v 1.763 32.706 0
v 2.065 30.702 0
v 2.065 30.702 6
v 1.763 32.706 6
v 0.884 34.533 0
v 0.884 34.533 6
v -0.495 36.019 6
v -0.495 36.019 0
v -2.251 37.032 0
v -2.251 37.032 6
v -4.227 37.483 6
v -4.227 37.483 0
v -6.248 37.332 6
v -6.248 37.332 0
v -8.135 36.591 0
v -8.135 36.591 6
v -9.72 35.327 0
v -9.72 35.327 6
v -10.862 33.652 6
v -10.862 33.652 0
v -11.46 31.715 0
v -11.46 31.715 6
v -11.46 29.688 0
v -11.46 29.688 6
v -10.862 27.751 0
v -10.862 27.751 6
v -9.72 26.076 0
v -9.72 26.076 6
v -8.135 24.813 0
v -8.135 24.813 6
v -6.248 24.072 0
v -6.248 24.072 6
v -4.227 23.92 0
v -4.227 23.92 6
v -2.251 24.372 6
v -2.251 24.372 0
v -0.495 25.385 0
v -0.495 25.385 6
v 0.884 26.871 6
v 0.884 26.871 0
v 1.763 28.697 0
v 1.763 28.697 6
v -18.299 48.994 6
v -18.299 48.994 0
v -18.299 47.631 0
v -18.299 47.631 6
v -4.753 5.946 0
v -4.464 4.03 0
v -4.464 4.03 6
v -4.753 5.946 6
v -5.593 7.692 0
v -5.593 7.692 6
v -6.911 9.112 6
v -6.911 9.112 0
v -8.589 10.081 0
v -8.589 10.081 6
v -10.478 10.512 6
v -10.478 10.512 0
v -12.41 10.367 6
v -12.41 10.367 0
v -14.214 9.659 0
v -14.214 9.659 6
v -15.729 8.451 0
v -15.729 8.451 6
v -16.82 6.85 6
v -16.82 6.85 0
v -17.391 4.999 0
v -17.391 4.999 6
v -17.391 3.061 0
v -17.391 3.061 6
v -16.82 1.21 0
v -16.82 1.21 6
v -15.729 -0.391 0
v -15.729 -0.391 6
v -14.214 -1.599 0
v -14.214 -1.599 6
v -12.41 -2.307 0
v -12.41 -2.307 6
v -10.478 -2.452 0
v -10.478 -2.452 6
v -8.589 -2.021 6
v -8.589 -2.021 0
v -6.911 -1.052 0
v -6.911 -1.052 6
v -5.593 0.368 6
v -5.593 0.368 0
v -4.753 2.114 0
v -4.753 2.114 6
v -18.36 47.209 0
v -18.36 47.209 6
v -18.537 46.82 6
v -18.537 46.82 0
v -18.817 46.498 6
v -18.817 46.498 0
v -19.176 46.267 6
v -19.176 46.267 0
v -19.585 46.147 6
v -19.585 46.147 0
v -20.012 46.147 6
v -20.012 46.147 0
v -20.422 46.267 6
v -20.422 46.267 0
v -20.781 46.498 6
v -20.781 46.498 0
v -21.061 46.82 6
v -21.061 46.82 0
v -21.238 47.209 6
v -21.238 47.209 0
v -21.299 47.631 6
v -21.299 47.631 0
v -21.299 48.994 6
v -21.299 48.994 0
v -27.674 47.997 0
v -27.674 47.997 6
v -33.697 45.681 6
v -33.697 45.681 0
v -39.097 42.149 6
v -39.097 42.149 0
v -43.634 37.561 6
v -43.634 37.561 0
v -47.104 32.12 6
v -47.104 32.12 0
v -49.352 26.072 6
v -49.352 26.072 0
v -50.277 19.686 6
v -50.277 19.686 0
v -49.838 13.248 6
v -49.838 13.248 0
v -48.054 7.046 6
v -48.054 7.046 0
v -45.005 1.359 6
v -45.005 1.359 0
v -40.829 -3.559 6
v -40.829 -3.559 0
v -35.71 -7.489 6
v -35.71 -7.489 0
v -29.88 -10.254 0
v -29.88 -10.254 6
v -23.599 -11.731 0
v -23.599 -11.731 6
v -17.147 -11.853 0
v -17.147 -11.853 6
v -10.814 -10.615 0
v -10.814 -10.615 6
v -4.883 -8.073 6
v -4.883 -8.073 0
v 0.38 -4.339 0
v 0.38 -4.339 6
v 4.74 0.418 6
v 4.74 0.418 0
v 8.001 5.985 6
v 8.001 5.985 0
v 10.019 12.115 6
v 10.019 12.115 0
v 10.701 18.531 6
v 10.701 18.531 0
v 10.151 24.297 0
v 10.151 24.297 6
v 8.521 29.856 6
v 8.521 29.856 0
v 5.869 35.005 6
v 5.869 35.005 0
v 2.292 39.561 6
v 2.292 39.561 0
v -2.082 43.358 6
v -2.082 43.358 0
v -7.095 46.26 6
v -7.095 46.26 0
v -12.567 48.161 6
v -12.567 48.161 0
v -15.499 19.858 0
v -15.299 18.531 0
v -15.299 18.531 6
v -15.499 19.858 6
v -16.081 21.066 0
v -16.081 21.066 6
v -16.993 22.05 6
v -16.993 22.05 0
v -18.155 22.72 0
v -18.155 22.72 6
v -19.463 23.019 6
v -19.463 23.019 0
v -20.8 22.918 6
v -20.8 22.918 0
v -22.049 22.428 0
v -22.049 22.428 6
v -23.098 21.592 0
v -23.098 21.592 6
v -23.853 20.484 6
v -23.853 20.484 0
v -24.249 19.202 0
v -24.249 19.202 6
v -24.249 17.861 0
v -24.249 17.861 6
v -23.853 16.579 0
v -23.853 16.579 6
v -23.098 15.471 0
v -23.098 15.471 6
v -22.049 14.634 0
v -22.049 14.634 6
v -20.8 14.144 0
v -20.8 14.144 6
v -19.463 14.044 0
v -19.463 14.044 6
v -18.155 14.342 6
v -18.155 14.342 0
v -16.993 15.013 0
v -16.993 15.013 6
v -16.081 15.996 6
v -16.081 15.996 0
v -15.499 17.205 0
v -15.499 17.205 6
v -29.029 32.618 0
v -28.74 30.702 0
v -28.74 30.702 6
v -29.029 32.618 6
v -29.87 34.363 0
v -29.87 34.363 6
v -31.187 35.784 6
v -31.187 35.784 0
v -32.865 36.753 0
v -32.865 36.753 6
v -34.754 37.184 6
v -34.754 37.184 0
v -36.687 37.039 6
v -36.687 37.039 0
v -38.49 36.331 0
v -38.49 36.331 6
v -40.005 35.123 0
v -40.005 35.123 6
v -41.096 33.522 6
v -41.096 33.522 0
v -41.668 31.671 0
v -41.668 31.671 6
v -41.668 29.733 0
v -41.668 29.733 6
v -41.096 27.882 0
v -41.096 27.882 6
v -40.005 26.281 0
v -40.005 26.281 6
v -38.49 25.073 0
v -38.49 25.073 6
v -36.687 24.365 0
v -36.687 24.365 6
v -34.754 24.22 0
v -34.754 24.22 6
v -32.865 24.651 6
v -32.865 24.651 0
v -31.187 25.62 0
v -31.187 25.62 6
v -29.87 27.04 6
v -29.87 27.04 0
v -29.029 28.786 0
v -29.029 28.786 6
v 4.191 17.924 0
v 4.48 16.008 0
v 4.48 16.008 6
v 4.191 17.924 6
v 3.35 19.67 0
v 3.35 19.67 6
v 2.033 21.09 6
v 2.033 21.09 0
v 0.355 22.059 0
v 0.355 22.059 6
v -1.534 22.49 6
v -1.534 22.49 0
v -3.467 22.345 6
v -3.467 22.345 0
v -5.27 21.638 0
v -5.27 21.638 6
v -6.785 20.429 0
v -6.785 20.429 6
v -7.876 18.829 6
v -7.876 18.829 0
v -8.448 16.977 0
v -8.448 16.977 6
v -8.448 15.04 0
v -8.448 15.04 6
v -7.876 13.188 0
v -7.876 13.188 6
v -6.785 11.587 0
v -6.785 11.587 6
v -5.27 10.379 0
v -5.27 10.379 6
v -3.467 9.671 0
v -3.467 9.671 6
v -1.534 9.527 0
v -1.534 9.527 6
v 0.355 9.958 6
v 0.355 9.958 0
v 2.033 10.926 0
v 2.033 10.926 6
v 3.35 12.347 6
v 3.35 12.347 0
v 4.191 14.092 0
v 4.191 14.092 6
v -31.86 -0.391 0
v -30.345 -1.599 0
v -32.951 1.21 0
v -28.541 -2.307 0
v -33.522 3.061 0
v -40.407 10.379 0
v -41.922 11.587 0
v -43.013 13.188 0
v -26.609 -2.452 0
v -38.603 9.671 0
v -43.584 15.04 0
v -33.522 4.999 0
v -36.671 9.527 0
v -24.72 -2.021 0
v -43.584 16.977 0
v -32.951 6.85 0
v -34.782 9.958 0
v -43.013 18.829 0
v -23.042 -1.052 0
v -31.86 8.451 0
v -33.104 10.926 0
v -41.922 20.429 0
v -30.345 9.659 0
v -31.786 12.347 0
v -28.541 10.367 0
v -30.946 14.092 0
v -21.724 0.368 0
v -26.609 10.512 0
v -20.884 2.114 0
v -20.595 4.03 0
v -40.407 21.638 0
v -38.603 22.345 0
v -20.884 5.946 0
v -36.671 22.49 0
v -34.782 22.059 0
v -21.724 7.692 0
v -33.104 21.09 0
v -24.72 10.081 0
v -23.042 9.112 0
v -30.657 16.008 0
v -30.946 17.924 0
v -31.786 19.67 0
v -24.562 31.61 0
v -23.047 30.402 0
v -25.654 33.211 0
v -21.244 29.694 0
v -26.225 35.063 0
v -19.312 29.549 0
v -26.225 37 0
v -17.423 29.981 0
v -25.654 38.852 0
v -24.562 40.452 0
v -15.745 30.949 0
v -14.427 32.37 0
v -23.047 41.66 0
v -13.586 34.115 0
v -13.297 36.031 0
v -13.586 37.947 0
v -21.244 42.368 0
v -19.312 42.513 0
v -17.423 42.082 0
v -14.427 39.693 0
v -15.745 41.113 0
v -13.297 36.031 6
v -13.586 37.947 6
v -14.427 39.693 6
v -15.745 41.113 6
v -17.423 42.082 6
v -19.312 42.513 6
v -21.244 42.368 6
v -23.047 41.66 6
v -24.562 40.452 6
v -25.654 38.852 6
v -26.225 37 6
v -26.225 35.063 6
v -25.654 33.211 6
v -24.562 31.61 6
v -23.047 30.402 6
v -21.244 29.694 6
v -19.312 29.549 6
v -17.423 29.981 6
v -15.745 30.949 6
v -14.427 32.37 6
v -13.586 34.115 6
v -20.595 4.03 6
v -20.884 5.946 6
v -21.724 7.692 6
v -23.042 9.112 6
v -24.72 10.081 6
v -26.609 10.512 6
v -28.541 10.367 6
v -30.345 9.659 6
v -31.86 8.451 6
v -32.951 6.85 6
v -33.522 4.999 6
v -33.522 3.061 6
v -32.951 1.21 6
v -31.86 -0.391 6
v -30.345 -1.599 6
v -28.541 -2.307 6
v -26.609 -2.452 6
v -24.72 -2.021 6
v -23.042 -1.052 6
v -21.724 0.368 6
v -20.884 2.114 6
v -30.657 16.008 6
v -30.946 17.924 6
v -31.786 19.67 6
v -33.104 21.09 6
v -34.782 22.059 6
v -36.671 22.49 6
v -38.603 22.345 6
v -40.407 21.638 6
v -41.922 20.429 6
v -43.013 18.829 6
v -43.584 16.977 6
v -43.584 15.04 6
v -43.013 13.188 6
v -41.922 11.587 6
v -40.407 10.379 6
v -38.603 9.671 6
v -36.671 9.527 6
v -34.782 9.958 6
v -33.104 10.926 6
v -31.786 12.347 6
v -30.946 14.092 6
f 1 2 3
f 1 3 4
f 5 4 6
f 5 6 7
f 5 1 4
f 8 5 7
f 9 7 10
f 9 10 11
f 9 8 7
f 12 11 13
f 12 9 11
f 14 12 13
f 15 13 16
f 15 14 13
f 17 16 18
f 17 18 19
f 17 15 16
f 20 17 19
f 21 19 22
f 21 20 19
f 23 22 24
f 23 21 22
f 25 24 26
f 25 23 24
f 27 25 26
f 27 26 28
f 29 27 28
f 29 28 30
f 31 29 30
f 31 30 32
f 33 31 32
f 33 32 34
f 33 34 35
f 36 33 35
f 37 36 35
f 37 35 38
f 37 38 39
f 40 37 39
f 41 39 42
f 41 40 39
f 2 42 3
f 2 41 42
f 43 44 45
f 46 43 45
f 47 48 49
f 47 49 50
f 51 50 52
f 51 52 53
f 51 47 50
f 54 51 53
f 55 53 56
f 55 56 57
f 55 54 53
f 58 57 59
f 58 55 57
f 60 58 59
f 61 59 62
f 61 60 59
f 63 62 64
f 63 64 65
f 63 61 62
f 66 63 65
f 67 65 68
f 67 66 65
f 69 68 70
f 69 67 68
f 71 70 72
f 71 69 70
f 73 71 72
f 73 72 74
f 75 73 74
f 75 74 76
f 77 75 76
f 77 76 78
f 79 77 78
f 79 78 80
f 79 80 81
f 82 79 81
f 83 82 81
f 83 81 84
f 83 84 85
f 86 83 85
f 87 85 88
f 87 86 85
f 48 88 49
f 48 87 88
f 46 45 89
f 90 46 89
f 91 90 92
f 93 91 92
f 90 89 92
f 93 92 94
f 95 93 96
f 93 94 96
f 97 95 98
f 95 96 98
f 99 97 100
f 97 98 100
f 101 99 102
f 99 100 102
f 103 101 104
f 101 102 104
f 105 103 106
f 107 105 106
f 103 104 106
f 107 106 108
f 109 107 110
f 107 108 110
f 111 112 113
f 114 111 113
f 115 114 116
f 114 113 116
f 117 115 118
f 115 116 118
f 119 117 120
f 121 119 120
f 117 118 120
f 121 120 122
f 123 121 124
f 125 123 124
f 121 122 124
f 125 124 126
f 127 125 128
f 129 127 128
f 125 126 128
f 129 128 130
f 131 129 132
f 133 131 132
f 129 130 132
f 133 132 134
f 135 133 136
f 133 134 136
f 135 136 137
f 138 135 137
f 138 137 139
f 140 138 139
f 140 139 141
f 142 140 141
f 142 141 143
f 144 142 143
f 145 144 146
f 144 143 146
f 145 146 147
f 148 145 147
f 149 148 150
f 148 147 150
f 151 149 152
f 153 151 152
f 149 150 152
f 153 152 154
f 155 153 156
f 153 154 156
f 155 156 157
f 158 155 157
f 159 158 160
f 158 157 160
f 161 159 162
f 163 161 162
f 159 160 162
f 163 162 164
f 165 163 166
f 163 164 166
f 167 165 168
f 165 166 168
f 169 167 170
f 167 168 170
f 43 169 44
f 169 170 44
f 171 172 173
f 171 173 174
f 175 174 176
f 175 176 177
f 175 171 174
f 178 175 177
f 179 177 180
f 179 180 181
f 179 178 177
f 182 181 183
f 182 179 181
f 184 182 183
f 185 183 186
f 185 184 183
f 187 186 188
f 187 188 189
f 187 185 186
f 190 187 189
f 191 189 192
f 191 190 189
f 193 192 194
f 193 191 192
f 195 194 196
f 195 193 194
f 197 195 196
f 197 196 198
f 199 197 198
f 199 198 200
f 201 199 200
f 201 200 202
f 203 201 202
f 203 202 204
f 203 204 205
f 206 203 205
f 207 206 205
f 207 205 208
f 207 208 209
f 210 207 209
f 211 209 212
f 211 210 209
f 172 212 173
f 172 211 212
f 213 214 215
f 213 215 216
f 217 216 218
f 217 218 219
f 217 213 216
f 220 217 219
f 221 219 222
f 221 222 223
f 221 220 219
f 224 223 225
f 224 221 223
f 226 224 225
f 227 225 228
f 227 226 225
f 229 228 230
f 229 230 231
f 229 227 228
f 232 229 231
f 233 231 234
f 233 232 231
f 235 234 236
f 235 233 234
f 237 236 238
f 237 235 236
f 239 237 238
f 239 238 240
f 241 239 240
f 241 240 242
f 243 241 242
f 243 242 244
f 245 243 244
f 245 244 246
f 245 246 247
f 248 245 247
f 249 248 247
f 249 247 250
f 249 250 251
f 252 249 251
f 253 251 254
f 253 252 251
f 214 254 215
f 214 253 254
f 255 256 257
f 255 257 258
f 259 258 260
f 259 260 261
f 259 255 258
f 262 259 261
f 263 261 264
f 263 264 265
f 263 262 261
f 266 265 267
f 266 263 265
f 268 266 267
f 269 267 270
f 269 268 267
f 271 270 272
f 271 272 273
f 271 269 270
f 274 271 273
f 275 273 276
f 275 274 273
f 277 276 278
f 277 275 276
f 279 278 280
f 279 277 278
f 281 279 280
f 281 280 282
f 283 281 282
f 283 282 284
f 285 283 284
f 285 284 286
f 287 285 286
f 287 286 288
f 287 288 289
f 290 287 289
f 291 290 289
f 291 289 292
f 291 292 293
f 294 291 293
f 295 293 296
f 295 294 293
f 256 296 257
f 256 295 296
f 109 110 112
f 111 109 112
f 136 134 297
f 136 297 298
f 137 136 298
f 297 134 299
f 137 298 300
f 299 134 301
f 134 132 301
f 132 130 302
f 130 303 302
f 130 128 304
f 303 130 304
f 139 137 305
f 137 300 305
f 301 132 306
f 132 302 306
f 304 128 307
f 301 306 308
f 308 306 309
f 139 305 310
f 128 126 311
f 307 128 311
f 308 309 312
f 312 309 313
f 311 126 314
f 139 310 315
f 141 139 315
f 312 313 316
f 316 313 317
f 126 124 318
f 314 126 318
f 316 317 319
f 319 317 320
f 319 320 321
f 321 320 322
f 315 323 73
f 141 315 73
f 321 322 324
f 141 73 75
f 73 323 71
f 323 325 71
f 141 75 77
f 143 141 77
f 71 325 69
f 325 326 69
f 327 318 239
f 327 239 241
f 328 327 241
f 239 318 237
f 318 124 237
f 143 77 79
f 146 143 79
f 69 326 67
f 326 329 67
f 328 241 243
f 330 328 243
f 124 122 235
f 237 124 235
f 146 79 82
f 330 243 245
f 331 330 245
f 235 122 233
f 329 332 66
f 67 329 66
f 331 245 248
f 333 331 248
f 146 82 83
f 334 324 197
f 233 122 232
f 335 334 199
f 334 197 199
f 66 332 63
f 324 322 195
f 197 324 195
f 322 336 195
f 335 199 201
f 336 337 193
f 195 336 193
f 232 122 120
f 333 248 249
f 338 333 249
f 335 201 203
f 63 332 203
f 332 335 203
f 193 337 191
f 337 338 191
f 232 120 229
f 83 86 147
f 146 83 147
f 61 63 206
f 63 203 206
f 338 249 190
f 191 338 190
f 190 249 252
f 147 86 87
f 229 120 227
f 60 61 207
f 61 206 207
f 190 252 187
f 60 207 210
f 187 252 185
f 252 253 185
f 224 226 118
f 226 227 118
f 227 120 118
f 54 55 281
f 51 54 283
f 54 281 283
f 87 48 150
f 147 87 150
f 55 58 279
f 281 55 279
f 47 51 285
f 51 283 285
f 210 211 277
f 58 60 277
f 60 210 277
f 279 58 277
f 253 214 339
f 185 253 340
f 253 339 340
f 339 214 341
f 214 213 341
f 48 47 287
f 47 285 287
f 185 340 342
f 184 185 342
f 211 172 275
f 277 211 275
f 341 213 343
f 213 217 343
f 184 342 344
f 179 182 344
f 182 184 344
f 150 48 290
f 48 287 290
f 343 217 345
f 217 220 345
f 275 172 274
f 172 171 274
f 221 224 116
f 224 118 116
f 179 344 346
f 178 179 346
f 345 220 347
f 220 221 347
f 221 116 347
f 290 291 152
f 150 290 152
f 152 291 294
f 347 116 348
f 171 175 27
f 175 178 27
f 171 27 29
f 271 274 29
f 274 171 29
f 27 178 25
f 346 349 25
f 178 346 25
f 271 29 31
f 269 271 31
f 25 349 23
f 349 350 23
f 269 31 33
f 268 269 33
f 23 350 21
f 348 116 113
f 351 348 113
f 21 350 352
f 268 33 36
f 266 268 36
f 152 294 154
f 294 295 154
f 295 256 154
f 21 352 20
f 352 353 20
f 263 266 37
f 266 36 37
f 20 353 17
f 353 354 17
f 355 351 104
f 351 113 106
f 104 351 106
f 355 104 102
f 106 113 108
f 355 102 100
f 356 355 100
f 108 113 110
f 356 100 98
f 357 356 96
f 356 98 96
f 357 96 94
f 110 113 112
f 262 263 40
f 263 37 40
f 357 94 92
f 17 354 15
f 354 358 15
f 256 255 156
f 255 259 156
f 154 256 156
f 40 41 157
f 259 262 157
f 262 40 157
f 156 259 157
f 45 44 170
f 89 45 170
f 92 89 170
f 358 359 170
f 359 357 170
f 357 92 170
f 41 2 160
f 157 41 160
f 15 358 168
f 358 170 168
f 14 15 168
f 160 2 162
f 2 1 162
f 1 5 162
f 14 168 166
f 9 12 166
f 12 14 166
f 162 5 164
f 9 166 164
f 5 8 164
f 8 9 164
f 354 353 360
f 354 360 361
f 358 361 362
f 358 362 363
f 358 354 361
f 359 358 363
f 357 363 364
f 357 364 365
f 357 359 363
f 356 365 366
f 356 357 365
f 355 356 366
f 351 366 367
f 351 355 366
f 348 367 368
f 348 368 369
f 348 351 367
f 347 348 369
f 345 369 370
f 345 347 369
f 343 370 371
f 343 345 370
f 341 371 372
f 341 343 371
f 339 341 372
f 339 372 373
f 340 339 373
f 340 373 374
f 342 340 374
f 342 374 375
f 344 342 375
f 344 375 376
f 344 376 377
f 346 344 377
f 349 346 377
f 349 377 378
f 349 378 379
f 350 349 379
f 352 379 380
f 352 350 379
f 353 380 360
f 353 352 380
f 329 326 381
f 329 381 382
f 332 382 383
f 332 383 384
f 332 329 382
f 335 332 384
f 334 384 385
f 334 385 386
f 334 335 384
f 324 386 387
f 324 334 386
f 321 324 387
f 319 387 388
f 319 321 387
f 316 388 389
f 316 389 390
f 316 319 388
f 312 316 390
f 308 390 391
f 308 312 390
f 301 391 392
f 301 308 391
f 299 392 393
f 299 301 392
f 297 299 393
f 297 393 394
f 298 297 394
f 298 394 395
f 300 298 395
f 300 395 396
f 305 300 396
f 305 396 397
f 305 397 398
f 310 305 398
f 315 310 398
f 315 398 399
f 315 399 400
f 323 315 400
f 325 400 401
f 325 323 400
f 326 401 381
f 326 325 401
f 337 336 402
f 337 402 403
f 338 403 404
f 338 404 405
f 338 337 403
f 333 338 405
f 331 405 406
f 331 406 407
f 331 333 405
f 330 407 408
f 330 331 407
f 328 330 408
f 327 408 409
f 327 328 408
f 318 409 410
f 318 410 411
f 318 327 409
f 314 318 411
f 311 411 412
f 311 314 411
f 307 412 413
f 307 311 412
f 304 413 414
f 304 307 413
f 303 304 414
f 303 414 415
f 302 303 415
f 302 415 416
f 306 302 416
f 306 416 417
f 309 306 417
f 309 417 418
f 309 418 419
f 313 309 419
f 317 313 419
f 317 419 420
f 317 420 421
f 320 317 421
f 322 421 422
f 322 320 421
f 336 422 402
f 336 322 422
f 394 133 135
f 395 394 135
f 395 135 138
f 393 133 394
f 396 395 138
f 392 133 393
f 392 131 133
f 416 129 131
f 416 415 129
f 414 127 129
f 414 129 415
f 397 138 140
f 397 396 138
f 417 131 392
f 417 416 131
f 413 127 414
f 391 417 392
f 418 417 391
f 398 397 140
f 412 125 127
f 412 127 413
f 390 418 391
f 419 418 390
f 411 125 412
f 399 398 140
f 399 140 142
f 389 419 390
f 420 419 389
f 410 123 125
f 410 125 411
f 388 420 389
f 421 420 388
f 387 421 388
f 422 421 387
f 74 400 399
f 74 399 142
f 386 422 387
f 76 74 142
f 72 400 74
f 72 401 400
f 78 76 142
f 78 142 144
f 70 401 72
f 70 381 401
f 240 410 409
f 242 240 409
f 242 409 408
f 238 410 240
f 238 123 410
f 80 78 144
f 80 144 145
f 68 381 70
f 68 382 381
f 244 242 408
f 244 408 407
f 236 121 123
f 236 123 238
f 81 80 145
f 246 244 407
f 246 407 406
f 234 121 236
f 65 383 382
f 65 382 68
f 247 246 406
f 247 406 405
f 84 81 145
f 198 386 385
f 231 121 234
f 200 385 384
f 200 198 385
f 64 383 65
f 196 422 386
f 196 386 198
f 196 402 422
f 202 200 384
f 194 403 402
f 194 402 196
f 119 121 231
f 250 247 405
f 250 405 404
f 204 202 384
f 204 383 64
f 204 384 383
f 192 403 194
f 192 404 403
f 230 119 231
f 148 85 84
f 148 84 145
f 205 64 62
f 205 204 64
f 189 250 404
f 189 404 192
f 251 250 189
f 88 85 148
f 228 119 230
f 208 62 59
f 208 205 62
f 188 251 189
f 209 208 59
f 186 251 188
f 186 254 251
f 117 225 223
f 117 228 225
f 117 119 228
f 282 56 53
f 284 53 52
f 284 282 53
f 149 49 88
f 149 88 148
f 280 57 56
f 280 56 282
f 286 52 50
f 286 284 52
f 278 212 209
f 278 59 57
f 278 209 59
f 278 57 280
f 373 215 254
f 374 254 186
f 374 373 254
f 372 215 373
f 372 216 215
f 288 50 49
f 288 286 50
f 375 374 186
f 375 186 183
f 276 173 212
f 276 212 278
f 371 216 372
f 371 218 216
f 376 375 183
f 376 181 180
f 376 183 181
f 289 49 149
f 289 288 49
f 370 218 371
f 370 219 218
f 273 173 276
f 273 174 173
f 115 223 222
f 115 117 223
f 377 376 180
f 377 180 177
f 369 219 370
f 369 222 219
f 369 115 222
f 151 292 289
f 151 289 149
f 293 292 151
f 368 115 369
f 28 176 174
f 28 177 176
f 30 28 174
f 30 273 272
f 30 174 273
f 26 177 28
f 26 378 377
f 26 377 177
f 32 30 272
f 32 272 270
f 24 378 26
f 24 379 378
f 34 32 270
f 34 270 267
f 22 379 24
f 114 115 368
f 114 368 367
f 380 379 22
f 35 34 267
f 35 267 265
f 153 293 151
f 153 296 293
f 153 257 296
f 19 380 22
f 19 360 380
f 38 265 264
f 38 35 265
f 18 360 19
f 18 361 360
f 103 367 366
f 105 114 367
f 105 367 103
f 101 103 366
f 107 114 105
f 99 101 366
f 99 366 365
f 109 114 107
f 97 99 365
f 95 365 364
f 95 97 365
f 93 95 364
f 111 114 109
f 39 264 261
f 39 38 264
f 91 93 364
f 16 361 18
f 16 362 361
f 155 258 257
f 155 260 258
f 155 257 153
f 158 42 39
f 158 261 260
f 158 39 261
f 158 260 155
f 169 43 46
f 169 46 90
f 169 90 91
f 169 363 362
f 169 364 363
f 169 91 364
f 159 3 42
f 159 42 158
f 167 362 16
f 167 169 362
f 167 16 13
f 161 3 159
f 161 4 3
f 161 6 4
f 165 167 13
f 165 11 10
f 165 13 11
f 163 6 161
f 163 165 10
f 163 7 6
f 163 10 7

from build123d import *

# Parameters (mm, degrees)
SZKIC1_R                    = 6.5
SZKIC1_R_2                  = 4.5
SZKIC1_R_3                  = 6.800419073
DODANIE_WYCI_GNI_CIE1_DEPTH = 6


with BuildPart() as part:
    # Szkic1 → Dodanie-wyciągnięcie1 (new body)
    with BuildSketch(Plane.XY):
        with BuildLine():
            ThreePointArc((10.70117022, 18.531289035), (2.291892255, 39.56102988), (-18.29882978, 48.994381459))
            Line((-18.29882978, 48.994381459), (-18.29882978, 47.631289035))
            ThreePointArc((-18.29882978, 47.631289035), (-19.79882978, 46.131289035), (-21.29882978, 47.631289035))
            Line((-21.29882978, 47.631289035), (-21.29882978, 48.994381459))
            ThreePointArc((-21.29882978, 48.994381459), (-40.828570624, -3.559432999), (10.70117022, 18.531289035))
        make_face()
        with Locations((-37.156723858, 16.008369355)):
            Circle(SZKIC1_R, mode=Mode.SUBTRACT)
        with Locations((-27.094885778, 4.029990689)):
            Circle(SZKIC1_R, mode=Mode.SUBTRACT)
        with Locations((-10.964002507, 4.029990689)):
            Circle(SZKIC1_R, mode=Mode.SUBTRACT)
        with Locations((-19.79882978, 18.531289035)):
            Circle(SZKIC1_R_2, mode=Mode.SUBTRACT)
        with Locations((-2.020146436, 16.008369355)):
            Circle(SZKIC1_R, mode=Mode.SUBTRACT)
        with Locations((-35.240183271, 30.701847186)):
            Circle(SZKIC1_R, mode=Mode.SUBTRACT)
        with Locations((-4.7352456, 30.701847186)):
            Circle(SZKIC1_R_3, mode=Mode.SUBTRACT)
        with Locations((-19.797413553, 36.031288978)):
            Circle(SZKIC1_R, mode=Mode.SUBTRACT)
    extrude(amount=DODANIE_WYCI_GNI_CIE1_DEPTH)


solid = part.part
